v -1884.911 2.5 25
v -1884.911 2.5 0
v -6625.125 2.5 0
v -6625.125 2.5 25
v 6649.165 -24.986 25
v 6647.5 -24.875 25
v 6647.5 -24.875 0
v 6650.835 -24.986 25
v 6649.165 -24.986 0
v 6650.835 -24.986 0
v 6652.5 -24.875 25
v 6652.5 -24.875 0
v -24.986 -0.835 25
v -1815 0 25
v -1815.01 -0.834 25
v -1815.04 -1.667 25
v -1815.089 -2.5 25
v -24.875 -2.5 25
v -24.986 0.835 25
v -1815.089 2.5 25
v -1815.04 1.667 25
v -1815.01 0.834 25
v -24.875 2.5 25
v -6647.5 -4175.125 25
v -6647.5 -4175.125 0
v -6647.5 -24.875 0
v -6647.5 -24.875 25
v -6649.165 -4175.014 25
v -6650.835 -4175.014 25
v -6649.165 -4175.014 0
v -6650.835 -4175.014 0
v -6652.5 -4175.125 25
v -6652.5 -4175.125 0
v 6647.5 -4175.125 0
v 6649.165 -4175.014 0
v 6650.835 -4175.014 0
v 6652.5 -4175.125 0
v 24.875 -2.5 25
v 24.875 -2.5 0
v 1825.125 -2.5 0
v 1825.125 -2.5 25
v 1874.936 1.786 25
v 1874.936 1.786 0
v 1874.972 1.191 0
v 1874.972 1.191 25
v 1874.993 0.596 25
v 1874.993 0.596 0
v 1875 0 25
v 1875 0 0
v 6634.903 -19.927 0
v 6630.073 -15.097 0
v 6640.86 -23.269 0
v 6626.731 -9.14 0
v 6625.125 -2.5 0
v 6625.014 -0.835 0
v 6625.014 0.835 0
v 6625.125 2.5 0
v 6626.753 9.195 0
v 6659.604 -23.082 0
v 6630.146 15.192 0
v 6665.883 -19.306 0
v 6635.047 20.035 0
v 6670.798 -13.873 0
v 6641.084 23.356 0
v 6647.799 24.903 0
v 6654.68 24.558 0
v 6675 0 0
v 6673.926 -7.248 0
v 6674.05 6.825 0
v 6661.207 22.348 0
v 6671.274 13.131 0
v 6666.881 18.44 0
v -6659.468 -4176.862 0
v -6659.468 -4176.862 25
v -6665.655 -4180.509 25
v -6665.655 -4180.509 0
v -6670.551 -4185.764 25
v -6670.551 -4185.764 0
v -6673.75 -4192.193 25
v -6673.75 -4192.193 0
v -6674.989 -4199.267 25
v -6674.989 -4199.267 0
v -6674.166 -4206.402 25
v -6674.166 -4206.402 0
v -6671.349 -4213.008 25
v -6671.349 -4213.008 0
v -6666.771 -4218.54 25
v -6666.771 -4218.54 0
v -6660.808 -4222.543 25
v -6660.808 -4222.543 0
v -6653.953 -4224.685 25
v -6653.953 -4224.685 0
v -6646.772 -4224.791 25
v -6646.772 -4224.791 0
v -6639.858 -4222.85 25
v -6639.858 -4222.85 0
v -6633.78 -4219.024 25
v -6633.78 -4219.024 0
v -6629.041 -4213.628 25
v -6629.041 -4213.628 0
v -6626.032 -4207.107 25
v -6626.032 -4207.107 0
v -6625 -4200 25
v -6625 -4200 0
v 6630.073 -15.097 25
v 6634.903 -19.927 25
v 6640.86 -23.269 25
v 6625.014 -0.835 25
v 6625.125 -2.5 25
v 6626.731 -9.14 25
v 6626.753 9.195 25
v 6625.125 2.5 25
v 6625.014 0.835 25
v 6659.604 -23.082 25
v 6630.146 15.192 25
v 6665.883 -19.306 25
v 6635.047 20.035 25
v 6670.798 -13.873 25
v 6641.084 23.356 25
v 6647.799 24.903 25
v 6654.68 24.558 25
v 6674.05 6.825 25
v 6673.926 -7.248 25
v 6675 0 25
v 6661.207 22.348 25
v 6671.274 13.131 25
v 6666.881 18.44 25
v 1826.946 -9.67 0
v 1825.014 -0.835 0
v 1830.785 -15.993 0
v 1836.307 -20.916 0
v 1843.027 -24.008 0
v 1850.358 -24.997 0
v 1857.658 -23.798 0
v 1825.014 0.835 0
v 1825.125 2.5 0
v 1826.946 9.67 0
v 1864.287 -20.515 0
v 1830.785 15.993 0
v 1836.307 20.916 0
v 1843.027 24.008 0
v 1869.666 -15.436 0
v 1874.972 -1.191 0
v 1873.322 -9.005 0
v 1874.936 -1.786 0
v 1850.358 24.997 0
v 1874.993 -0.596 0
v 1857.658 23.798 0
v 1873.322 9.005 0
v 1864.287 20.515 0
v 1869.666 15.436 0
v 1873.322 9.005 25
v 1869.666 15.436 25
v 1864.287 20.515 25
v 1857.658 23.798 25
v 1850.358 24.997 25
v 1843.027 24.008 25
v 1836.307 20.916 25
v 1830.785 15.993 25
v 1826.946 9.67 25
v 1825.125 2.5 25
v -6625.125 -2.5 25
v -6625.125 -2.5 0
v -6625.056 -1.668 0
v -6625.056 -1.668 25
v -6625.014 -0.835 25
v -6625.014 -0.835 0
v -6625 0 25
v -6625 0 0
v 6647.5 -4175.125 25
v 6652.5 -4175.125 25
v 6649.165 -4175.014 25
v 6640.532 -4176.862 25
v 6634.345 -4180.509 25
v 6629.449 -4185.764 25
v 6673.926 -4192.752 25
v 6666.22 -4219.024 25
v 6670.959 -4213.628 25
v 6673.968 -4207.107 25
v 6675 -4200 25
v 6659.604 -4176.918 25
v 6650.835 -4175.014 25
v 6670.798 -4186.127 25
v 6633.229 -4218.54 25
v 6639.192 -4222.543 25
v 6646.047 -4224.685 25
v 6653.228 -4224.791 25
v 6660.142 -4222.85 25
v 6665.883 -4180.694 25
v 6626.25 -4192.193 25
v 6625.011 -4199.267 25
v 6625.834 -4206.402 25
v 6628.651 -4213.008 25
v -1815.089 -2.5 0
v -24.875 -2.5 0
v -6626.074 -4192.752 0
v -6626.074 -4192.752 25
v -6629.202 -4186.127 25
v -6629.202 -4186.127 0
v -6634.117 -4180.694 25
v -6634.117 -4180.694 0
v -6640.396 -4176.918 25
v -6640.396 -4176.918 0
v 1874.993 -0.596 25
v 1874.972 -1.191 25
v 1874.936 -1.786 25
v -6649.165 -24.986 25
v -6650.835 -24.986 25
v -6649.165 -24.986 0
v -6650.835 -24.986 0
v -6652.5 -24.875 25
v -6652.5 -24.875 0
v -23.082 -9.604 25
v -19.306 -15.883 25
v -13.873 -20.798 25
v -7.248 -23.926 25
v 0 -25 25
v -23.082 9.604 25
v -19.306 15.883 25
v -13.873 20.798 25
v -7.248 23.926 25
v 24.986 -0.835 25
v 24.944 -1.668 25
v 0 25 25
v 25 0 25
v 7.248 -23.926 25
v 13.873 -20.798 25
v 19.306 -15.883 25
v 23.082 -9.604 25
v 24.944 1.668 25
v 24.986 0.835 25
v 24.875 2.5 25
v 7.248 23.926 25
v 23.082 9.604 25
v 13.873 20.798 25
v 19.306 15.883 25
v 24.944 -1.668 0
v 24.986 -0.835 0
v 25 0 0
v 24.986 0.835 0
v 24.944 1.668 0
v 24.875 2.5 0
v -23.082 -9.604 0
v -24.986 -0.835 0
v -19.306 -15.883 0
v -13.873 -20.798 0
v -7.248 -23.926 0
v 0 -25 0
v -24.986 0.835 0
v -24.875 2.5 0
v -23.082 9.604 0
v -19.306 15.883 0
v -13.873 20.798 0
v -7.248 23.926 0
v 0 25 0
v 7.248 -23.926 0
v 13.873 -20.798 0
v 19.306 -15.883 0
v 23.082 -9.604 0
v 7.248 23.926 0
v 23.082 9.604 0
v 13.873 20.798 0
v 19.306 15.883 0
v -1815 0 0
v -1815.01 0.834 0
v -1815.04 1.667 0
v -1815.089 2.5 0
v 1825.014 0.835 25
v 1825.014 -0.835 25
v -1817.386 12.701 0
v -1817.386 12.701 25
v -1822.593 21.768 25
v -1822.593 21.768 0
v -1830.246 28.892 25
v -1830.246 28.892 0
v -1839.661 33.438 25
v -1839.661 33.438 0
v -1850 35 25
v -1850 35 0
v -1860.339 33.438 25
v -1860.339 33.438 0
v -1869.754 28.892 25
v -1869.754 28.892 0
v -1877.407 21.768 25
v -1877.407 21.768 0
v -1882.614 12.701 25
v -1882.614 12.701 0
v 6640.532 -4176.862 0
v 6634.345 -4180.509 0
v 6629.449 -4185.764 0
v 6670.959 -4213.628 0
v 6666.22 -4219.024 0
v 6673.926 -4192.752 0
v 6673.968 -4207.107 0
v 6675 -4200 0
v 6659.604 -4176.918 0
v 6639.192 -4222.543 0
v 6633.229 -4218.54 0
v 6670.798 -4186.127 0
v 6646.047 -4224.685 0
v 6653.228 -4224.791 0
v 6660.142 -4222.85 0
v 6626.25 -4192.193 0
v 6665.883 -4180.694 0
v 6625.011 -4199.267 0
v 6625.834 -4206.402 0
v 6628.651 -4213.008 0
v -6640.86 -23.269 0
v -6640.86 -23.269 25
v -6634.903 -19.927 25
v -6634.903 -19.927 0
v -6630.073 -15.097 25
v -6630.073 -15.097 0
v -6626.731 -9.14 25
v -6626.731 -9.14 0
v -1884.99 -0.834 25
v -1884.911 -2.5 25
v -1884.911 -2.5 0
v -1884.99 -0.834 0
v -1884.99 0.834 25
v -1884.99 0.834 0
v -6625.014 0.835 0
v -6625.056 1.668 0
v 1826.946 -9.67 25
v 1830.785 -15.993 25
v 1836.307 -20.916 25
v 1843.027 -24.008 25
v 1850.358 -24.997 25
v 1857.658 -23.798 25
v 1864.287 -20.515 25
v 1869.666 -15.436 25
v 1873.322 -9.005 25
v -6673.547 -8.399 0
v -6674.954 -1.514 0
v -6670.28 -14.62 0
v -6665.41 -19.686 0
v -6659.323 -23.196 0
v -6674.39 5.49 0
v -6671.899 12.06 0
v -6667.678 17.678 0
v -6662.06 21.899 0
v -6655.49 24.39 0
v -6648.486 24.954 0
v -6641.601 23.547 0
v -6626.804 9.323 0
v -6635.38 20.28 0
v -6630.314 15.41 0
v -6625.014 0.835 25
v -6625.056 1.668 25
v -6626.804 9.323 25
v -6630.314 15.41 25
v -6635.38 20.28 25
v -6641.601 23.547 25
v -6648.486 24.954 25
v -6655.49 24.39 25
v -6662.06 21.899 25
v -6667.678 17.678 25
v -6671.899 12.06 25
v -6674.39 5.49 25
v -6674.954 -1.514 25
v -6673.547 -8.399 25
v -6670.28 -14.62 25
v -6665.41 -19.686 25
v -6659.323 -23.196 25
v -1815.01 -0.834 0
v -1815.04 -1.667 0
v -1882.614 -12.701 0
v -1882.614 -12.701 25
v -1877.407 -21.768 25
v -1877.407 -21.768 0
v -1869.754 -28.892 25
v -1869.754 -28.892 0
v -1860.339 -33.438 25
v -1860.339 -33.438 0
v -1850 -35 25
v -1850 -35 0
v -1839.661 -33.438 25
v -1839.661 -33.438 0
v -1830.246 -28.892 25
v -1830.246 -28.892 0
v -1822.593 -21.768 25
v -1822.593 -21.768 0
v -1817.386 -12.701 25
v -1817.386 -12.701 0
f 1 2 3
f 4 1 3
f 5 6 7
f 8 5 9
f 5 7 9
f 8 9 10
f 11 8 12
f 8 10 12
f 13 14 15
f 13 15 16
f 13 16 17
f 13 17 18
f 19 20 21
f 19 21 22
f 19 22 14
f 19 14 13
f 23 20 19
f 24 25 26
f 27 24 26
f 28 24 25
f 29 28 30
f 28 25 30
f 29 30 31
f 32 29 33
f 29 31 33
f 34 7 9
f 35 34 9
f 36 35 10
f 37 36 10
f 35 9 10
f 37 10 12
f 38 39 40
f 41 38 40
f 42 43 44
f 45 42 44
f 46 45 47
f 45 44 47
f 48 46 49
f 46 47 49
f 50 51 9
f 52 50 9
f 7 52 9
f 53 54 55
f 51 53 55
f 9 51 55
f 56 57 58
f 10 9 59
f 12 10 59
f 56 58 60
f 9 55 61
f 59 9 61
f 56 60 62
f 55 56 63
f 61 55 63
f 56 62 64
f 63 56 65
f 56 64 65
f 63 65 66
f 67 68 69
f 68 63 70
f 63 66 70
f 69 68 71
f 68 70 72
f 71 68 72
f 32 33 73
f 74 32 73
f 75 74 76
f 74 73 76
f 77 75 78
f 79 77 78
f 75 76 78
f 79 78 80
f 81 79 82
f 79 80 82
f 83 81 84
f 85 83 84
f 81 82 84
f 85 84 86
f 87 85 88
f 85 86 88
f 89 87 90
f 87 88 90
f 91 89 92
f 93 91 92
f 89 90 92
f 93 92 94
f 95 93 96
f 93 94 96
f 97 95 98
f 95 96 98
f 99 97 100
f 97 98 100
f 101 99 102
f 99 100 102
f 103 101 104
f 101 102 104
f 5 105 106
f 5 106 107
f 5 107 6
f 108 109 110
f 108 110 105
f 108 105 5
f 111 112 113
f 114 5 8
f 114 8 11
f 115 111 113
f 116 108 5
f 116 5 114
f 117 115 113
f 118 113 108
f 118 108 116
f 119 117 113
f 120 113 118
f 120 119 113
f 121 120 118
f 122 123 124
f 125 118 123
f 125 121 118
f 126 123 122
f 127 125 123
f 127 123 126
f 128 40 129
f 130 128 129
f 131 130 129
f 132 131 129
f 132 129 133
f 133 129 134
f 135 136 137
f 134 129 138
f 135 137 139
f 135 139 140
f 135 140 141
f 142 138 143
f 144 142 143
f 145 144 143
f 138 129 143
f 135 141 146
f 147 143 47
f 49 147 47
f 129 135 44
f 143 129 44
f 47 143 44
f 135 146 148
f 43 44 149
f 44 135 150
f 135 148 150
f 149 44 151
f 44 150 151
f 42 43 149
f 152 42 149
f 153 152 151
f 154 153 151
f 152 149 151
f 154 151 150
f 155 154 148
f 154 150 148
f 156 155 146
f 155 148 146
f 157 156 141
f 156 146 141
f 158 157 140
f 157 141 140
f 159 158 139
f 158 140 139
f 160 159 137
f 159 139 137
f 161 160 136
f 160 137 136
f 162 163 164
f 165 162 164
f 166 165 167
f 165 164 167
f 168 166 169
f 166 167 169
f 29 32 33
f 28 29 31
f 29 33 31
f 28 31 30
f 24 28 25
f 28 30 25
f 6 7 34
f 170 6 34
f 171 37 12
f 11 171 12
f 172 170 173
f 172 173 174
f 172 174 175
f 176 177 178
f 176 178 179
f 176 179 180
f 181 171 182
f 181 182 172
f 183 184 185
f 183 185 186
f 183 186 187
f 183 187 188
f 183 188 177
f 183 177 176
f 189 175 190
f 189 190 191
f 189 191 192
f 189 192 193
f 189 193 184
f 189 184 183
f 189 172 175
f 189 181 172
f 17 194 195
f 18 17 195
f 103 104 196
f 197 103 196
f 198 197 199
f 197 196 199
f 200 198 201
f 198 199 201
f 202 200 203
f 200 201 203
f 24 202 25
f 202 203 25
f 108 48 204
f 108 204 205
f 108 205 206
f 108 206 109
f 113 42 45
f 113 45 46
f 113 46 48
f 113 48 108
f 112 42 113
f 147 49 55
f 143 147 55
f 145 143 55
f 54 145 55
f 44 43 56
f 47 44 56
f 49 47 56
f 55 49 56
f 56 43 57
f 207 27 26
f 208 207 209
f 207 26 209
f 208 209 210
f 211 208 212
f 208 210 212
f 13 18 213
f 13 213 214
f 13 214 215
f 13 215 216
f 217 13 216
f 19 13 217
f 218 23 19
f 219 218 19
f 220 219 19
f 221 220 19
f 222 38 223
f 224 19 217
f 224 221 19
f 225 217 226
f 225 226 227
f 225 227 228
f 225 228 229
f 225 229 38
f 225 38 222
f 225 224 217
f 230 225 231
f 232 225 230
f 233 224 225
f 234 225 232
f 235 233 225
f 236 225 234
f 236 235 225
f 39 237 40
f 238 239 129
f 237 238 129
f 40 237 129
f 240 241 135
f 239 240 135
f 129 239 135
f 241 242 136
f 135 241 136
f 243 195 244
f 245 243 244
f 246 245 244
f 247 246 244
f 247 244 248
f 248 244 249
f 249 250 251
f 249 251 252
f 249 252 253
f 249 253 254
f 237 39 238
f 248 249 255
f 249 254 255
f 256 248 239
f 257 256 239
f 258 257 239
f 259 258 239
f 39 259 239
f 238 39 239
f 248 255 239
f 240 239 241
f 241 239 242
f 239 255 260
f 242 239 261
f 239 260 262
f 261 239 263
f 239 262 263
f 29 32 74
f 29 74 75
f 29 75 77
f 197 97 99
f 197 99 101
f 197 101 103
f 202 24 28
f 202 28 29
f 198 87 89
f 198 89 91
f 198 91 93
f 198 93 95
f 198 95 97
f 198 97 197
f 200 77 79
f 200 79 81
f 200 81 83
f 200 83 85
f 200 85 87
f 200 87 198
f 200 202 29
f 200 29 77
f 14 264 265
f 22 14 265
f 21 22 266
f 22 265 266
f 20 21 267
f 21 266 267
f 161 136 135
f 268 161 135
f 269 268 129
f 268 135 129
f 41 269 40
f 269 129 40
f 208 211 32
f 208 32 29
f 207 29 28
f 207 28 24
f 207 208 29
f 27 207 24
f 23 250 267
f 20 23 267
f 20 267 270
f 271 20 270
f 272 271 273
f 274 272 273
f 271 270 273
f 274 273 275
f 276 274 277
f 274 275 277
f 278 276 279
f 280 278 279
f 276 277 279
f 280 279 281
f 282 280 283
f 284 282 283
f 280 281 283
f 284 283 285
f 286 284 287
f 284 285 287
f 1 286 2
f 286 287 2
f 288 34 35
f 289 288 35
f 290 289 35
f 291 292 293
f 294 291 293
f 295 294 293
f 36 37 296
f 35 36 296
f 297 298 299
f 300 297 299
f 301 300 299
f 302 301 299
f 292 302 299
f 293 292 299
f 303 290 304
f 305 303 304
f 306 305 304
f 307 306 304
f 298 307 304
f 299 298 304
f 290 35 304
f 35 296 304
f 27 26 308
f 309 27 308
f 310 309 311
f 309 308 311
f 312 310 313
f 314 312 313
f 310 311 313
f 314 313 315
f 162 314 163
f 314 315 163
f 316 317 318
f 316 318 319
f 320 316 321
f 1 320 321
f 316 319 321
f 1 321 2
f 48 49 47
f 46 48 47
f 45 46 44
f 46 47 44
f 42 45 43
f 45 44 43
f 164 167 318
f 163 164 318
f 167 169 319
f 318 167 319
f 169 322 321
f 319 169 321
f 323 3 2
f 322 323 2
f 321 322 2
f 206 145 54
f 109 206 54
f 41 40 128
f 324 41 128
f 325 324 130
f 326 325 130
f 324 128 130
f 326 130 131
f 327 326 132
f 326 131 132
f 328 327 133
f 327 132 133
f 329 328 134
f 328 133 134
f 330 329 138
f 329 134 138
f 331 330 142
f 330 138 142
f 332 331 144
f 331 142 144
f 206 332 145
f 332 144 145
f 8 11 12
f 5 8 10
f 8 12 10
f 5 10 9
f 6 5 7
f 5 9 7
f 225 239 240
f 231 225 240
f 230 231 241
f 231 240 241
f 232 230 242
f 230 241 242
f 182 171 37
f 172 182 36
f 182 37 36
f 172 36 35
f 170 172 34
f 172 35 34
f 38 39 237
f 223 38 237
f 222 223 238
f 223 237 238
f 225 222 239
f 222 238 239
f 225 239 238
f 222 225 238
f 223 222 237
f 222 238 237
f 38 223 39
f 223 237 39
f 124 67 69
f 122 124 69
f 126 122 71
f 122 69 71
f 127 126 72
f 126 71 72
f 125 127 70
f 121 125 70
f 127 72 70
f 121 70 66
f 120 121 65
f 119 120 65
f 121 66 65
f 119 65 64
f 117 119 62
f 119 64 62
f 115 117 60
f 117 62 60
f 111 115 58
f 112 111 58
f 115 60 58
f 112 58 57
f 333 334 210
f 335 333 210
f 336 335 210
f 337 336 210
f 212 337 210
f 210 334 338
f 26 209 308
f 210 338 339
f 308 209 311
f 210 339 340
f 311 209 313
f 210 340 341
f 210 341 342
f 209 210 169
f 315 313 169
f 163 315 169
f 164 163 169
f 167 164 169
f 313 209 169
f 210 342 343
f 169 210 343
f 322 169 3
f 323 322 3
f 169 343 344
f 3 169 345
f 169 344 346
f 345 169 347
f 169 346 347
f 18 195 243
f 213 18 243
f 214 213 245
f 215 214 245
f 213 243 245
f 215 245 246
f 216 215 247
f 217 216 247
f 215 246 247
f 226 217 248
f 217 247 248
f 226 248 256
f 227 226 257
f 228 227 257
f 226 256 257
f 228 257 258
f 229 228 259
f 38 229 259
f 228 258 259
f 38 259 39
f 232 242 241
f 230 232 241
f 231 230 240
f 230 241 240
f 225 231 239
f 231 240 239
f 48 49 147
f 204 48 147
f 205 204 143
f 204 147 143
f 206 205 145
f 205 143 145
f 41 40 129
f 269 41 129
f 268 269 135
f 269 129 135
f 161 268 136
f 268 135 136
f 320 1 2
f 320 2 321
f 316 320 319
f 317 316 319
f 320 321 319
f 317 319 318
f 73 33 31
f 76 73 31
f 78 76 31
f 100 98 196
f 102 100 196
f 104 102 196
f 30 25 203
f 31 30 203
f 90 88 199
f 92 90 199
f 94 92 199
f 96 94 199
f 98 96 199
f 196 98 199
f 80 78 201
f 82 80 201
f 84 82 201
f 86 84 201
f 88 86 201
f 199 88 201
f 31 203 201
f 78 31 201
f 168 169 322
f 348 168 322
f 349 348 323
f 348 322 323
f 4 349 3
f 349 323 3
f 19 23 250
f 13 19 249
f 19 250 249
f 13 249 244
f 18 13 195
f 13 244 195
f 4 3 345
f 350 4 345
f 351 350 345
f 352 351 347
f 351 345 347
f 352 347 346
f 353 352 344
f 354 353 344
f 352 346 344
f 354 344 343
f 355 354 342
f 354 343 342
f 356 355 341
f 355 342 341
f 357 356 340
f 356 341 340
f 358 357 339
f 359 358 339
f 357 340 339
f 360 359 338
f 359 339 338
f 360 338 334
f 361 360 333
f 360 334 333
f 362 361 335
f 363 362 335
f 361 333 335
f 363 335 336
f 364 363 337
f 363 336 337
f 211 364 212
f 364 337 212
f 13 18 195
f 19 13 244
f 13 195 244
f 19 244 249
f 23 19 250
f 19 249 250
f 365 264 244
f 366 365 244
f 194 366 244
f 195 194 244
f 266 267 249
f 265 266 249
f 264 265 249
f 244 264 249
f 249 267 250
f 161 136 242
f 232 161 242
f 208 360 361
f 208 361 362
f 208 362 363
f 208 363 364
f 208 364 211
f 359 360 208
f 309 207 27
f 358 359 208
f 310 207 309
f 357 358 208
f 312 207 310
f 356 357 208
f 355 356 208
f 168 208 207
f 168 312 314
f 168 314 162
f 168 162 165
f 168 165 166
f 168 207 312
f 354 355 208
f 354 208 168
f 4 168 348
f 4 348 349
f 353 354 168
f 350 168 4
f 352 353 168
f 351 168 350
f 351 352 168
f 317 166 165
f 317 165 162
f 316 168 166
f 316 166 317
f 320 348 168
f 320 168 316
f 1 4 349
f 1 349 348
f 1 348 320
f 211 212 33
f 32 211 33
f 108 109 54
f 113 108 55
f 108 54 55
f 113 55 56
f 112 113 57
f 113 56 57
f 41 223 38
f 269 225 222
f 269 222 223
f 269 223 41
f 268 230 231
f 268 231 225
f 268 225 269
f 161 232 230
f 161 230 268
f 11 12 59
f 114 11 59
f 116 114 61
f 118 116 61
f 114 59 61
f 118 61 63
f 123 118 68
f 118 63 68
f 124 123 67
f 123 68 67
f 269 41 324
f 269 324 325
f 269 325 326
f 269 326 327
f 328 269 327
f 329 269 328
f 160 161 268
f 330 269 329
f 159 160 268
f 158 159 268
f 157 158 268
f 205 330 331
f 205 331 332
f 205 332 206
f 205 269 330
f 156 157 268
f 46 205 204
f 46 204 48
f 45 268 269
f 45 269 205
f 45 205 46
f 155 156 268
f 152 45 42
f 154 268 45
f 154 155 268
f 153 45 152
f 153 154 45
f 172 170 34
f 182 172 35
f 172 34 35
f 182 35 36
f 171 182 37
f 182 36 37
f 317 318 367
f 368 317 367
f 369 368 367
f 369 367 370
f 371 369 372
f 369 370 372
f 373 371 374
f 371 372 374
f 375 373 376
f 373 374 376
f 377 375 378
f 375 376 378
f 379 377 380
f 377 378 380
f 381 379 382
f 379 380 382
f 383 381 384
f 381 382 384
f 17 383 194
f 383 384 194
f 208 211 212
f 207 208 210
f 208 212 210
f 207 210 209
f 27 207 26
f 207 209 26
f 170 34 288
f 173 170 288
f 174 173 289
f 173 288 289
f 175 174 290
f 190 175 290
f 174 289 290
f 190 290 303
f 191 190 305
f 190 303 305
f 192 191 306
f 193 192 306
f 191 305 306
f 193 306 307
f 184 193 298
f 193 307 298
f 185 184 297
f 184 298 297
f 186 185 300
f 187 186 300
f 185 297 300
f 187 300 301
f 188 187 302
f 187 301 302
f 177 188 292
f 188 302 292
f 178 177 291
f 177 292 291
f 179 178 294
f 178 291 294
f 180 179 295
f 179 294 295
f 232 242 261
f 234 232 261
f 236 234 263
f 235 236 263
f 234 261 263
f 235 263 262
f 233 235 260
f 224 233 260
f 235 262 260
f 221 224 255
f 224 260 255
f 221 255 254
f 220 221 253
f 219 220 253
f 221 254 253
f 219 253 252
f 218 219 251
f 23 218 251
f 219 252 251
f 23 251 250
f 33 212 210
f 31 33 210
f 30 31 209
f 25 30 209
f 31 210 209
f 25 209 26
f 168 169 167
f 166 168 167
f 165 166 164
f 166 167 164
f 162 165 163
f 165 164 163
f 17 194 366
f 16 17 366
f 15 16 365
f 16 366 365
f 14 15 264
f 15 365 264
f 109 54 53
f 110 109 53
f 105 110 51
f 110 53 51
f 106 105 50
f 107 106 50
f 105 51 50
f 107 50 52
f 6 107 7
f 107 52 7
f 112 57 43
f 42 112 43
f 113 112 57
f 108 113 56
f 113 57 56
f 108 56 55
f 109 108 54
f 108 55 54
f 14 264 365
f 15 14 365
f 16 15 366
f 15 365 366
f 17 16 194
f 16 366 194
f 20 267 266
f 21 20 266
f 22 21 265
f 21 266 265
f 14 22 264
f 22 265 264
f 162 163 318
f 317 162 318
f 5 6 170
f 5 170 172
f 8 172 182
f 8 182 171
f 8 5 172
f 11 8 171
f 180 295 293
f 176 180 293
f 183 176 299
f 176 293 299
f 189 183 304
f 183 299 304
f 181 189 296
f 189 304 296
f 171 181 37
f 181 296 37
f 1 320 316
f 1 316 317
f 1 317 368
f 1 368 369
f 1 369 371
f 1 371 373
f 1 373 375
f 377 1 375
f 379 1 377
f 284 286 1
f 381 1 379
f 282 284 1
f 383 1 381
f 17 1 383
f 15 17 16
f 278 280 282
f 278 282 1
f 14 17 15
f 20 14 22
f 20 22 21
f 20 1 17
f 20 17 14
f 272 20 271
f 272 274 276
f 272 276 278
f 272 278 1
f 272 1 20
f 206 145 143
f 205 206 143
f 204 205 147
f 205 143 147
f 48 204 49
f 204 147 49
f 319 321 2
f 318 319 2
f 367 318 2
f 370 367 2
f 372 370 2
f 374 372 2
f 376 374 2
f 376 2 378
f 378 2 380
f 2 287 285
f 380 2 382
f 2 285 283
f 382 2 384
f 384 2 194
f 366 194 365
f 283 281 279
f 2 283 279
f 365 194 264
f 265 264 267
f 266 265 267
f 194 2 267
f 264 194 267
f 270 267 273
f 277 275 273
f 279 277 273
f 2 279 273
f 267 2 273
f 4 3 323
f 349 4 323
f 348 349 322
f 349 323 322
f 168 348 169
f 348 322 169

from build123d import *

# Parameters (mm, degrees)
F1_DEPTH = 25
F2_DEPTH = 25


with BuildPart() as f1:
    # F0 (on Top) → F1 (new body)
    with BuildSketch(Plane.XY):
        with BuildLine():
            ThreePointArc((-1815.0893998906, 2.5), (-1815.0223571132, 1.2507989787), (-1815, 0))
            ThreePointArc((-1815, 0), (-1815.0223571132, -1.2507989787), (-1815.0893998906, -2.5))
            Line((-1815.0893998906, -2.5), (-24.8746859277, -2.5))
            ThreePointArc((-24.8746859277, -2.5), (-25, 0), (-24.8746859277, 2.5))
            Line((-24.8746859277, 2.5), (-1815.0893998906, 2.5))
        make_face()
    extrude(amount=F1_DEPTH)


with BuildPart() as f1b:
    # F0 (on Top) → F1, piece 2 (new body)
    with BuildSketch(Plane.XY):
        with BuildLine():
            ThreePointArc((-1884.9106001091, -2.5000000044), (-1885, -3e-09), (-1884.9106001095, 2.4999999984))
            Line((-1884.9106001095, 2.4999999984), (-6625.1253140726, 2.5000000028))
            ThreePointArc((-6625.1253140726, 2.5000000028), (-6625.0313481723, 1.2515693779), (-6625, 0))
            ThreePointArc((-6625, 0), (-6625.0313481722, -1.2515693765), (-6625.1253140723, -2.5))
            Line((-6625.1253140723, -2.5), (-1884.9106001091, -2.5000000044))
        make_face()
    extrude(amount=F1_DEPTH)


with BuildPart() as f1c:
    # F0 (on Top) → F1, piece 3 (new body)
    with BuildSketch(Plane.XY):
        with BuildLine():
            ThreePointArc((-6647.5, -24.8746859277), (-6650, -25), (-6652.5, -24.8746859277))
            Line((-6652.5, -24.8746859277), (-6652.5, -4175.1253140723))
            ThreePointArc((-6652.5, -4175.1253140723), (-6650, -4175), (-6647.5, -4175.1253140723))
            Line((-6647.5, -4175.1253140723), (-6647.5, -24.8746859277))
        make_face()
    extrude(amount=F1_DEPTH)


with BuildPart() as f1d:
    # F0 (on Top) → F1, piece 4 (new body)
    with BuildSketch(Plane.XY):
        with BuildLine():
            Line((1825.1253140723, 2.5), (24.8746859277, 2.5))
            ThreePointArc((24.8746859277, 2.5), (24.9686518278, 1.2515693765), (25, 0))
            ThreePointArc((25, 0), (24.9686518278, -1.2515693765), (24.8746859277, -2.5))
            Line((24.8746859277, -2.5), (1825.1253140723, -2.5))
            ThreePointArc((1825.1253140723, -2.5), (1825, 0), (1825.1253140723, 2.5))
        make_face()
    extrude(amount=F1_DEPTH)


with BuildPart() as f1e:
    # F0 (on Top) → F1, piece 5 (new body)
    with BuildSketch(Plane.XY):
        with BuildLine():
            Line((6625.1253140723, 2.5), (1874.9361429353, 1.7857142857))
            ThreePointArc((1874.9361429353, 1.7857142857), (1874.9840306334, 0.8934278419), (1875, 0))
            ThreePointArc((1875, 0), (1874.9840306334, -0.8934278419), (1874.9361429353, -1.7857142857))
            Line((1874.9361429353, -1.7857142857), (6625.1253140723, -2.5))
            ThreePointArc((6625.1253140723, -2.5), (6625, 0), (6625.1253140723, 2.5))
        make_face()
    extrude(amount=F1_DEPTH)


with BuildPart() as f1f:
    # F0 (on Top) → F1, piece 6 (new body)
    with BuildSketch(Plane.XY):
        with BuildLine():
            ThreePointArc((6652.5, -24.8746859277), (6650, -25), (6647.5, -24.8746859277))
            Line((6647.5, -24.8746859277), (6647.5, -4175.1253140723))
            ThreePointArc((6647.5, -4175.1253140723), (6650, -4175), (6652.5, -4175.1253140723))
            Line((6652.5, -4175.1253140723), (6652.5, -24.8746859277))
        make_face()
    extrude(amount=F1_DEPTH)


with BuildPart() as f2:
    # F0 (on Top) → F2 (new body)
    with BuildSketch(Plane.XY):
        with BuildLine():
            Line((-6652.5, -4200), (-6652.5, -4175.1253140723))
            ThreePointArc((-6652.5, -4175.1253140723), (-6666.7705098312, -4218.5404962177), (-6625, -4200))
            ThreePointArc((-6625, -4200), (-6631.4595037823, -4183.2294901688), (-6647.5, -4175.1253140723))
            Line((-6647.5, -4175.1253140723), (-6647.5, -4200))
            ThreePointArc((-6647.5, -4200), (-6650, -4202.5), (-6652.5, -4200))
        make_face()
        with BuildLine():
            ThreePointArc((-6647.5, -4175.1253140723), (-6650, -4175), (-6652.5, -4175.1253140723))
            Line((-6652.5, -4175.1253140723), (-6652.5, -4200))
            ThreePointArc((-6652.5, -4200), (-6650, -4202.5), (-6647.5, -4200))
            Line((-6647.5, -4200), (-6647.5, -4175.1253140723))
        make_face()
    extrude(amount=F2_DEPTH)


with BuildPart() as f2b:
    # F0 (on Top) → F2, piece 2 (new body)
    with BuildSketch(Plane.XY):
        with BuildLine():
            ThreePointArc((-6625, 0), (-6625.0313481723, 1.2515693779), (-6625.1253140726, 2.5000000028))
            ThreePointArc((-6625.1253140726, 2.5000000028), (-6667.6776695307, 17.6776695287), (-6652.5, -24.8746859277))
            ThreePointArc((-6652.5, -24.8746859277), (-6650, -25), (-6647.5, -24.8746859277))
            ThreePointArc((-6647.5, -24.8746859277), (-6632.3223304703, -17.6776695297), (-6625.1253140723, -2.5))
            ThreePointArc((-6625.1253140723, -2.5), (-6625.0313481722, -1.2515693765), (-6625, 0))
        make_face()
    extrude(amount=F2_DEPTH)


with BuildPart() as f2c:
    # F0 (on Top) → F2, piece 3 (new body)
    with BuildSketch(Plane.XY):
        with BuildLine():
            ThreePointArc((-1815.0893998906, -2.5), (-1815.0223571132, -1.2507989787), (-1815, 0))
            ThreePointArc((-1815, 0), (-1815.0223571132, 1.2507989787), (-1815.0893998906, 2.5))
            ThreePointArc((-1815.0893998906, 2.5), (-1850.0000000008, 35), (-1884.9106001095, 2.4999999984))
            ThreePointArc((-1884.9106001095, 2.4999999984), (-1885, -3e-09), (-1884.9106001091, -2.5000000044))
            ThreePointArc((-1884.9106001091, -2.5000000044), (-1849.9999999978, -35), (-1815.0893998906, -2.5))
        make_face()
    extrude(amount=F2_DEPTH)


with BuildPart() as f2d:
    # F0 (on Top) → F2, piece 4 (new body)
    with BuildSketch(Plane.XY):
        with BuildLine():
            ThreePointArc((24.8746859277, 2.5), (0, 25), (-24.8746859277, 2.5))
            ThreePointArc((-24.8746859277, 2.5), (-25, 0), (-24.8746859277, -2.5))
            ThreePointArc((-24.8746859277, -2.5), (0, -25), (24.8746859277, -2.5))
            ThreePointArc((24.8746859277, -2.5), (24.9686518278, -1.2515693765), (25, 0))
            ThreePointArc((25, 0), (24.9686518278, 1.2515693765), (24.8746859277, 2.5))
        make_face()
    extrude(amount=F2_DEPTH)


with BuildPart() as f2e:
    # F0 (on Top) → F2, piece 5 (new body)
    with BuildSketch(Plane.XY):
        with BuildLine():
            ThreePointArc((1874.9361429353, 1.7857142857), (1850.358462357, 24.9974299627), (1825.1253140723, 2.5))
            ThreePointArc((1825.1253140723, 2.5), (1825, 0), (1825.1253140723, -2.5))
            ThreePointArc((1825.1253140723, -2.5), (1850.358462357, -24.9974299627), (1874.9361429353, -1.7857142857))
            ThreePointArc((1874.9361429353, -1.7857142857), (1874.9840306334, -0.8934278419), (1875, 0))
            ThreePointArc((1875, 0), (1874.9840306334, 0.8934278419), (1874.9361429353, 1.7857142857))
        make_face()
    extrude(amount=F2_DEPTH)


with BuildPart() as f2f:
    # F0 (on Top) → F2, piece 6 (new body)
    with BuildSketch(Plane.XY):
        with BuildLine():
            ThreePointArc((6675, 0), (6651.2515693765, 24.9686518278), (6625.1253140723, 2.5))
            ThreePointArc((6625.1253140723, 2.5), (6625, 0), (6625.1253140723, -2.5))
            ThreePointArc((6625.1253140723, -2.5), (6632.3223304703, -17.6776695297), (6647.5, -24.8746859277))
            ThreePointArc((6647.5, -24.8746859277), (6650, -25), (6652.5, -24.8746859277))
            ThreePointArc((6652.5, -24.8746859277), (6668.5404962177, -16.7705098312), (6675, 0))
        make_face()
    extrude(amount=F2_DEPTH)


with BuildPart() as f2g:
    # F0 (on Top) → F2, piece 7 (new body)
    with BuildSketch(Plane.XY):
        with BuildLine():
            ThreePointArc((6652.5, -4175.1253140723), (6650, -4175), (6647.5, -4175.1253140723))
            ThreePointArc((6647.5, -4175.1253140723), (6633.2294901688, -4218.5404962177), (6675, -4200))
            ThreePointArc((6675, -4200), (6668.5404962177, -4183.2294901688), (6652.5, -4175.1253140723))
        make_face()
    extrude(amount=F2_DEPTH)


solid = Compound([f1.part, f1b.part, f1c.part, f1d.part, f1e.part, f1f.part, f2.part, f2b.part, f2c.part, f2d.part, f2e.part, f2f.part, f2g.part])
